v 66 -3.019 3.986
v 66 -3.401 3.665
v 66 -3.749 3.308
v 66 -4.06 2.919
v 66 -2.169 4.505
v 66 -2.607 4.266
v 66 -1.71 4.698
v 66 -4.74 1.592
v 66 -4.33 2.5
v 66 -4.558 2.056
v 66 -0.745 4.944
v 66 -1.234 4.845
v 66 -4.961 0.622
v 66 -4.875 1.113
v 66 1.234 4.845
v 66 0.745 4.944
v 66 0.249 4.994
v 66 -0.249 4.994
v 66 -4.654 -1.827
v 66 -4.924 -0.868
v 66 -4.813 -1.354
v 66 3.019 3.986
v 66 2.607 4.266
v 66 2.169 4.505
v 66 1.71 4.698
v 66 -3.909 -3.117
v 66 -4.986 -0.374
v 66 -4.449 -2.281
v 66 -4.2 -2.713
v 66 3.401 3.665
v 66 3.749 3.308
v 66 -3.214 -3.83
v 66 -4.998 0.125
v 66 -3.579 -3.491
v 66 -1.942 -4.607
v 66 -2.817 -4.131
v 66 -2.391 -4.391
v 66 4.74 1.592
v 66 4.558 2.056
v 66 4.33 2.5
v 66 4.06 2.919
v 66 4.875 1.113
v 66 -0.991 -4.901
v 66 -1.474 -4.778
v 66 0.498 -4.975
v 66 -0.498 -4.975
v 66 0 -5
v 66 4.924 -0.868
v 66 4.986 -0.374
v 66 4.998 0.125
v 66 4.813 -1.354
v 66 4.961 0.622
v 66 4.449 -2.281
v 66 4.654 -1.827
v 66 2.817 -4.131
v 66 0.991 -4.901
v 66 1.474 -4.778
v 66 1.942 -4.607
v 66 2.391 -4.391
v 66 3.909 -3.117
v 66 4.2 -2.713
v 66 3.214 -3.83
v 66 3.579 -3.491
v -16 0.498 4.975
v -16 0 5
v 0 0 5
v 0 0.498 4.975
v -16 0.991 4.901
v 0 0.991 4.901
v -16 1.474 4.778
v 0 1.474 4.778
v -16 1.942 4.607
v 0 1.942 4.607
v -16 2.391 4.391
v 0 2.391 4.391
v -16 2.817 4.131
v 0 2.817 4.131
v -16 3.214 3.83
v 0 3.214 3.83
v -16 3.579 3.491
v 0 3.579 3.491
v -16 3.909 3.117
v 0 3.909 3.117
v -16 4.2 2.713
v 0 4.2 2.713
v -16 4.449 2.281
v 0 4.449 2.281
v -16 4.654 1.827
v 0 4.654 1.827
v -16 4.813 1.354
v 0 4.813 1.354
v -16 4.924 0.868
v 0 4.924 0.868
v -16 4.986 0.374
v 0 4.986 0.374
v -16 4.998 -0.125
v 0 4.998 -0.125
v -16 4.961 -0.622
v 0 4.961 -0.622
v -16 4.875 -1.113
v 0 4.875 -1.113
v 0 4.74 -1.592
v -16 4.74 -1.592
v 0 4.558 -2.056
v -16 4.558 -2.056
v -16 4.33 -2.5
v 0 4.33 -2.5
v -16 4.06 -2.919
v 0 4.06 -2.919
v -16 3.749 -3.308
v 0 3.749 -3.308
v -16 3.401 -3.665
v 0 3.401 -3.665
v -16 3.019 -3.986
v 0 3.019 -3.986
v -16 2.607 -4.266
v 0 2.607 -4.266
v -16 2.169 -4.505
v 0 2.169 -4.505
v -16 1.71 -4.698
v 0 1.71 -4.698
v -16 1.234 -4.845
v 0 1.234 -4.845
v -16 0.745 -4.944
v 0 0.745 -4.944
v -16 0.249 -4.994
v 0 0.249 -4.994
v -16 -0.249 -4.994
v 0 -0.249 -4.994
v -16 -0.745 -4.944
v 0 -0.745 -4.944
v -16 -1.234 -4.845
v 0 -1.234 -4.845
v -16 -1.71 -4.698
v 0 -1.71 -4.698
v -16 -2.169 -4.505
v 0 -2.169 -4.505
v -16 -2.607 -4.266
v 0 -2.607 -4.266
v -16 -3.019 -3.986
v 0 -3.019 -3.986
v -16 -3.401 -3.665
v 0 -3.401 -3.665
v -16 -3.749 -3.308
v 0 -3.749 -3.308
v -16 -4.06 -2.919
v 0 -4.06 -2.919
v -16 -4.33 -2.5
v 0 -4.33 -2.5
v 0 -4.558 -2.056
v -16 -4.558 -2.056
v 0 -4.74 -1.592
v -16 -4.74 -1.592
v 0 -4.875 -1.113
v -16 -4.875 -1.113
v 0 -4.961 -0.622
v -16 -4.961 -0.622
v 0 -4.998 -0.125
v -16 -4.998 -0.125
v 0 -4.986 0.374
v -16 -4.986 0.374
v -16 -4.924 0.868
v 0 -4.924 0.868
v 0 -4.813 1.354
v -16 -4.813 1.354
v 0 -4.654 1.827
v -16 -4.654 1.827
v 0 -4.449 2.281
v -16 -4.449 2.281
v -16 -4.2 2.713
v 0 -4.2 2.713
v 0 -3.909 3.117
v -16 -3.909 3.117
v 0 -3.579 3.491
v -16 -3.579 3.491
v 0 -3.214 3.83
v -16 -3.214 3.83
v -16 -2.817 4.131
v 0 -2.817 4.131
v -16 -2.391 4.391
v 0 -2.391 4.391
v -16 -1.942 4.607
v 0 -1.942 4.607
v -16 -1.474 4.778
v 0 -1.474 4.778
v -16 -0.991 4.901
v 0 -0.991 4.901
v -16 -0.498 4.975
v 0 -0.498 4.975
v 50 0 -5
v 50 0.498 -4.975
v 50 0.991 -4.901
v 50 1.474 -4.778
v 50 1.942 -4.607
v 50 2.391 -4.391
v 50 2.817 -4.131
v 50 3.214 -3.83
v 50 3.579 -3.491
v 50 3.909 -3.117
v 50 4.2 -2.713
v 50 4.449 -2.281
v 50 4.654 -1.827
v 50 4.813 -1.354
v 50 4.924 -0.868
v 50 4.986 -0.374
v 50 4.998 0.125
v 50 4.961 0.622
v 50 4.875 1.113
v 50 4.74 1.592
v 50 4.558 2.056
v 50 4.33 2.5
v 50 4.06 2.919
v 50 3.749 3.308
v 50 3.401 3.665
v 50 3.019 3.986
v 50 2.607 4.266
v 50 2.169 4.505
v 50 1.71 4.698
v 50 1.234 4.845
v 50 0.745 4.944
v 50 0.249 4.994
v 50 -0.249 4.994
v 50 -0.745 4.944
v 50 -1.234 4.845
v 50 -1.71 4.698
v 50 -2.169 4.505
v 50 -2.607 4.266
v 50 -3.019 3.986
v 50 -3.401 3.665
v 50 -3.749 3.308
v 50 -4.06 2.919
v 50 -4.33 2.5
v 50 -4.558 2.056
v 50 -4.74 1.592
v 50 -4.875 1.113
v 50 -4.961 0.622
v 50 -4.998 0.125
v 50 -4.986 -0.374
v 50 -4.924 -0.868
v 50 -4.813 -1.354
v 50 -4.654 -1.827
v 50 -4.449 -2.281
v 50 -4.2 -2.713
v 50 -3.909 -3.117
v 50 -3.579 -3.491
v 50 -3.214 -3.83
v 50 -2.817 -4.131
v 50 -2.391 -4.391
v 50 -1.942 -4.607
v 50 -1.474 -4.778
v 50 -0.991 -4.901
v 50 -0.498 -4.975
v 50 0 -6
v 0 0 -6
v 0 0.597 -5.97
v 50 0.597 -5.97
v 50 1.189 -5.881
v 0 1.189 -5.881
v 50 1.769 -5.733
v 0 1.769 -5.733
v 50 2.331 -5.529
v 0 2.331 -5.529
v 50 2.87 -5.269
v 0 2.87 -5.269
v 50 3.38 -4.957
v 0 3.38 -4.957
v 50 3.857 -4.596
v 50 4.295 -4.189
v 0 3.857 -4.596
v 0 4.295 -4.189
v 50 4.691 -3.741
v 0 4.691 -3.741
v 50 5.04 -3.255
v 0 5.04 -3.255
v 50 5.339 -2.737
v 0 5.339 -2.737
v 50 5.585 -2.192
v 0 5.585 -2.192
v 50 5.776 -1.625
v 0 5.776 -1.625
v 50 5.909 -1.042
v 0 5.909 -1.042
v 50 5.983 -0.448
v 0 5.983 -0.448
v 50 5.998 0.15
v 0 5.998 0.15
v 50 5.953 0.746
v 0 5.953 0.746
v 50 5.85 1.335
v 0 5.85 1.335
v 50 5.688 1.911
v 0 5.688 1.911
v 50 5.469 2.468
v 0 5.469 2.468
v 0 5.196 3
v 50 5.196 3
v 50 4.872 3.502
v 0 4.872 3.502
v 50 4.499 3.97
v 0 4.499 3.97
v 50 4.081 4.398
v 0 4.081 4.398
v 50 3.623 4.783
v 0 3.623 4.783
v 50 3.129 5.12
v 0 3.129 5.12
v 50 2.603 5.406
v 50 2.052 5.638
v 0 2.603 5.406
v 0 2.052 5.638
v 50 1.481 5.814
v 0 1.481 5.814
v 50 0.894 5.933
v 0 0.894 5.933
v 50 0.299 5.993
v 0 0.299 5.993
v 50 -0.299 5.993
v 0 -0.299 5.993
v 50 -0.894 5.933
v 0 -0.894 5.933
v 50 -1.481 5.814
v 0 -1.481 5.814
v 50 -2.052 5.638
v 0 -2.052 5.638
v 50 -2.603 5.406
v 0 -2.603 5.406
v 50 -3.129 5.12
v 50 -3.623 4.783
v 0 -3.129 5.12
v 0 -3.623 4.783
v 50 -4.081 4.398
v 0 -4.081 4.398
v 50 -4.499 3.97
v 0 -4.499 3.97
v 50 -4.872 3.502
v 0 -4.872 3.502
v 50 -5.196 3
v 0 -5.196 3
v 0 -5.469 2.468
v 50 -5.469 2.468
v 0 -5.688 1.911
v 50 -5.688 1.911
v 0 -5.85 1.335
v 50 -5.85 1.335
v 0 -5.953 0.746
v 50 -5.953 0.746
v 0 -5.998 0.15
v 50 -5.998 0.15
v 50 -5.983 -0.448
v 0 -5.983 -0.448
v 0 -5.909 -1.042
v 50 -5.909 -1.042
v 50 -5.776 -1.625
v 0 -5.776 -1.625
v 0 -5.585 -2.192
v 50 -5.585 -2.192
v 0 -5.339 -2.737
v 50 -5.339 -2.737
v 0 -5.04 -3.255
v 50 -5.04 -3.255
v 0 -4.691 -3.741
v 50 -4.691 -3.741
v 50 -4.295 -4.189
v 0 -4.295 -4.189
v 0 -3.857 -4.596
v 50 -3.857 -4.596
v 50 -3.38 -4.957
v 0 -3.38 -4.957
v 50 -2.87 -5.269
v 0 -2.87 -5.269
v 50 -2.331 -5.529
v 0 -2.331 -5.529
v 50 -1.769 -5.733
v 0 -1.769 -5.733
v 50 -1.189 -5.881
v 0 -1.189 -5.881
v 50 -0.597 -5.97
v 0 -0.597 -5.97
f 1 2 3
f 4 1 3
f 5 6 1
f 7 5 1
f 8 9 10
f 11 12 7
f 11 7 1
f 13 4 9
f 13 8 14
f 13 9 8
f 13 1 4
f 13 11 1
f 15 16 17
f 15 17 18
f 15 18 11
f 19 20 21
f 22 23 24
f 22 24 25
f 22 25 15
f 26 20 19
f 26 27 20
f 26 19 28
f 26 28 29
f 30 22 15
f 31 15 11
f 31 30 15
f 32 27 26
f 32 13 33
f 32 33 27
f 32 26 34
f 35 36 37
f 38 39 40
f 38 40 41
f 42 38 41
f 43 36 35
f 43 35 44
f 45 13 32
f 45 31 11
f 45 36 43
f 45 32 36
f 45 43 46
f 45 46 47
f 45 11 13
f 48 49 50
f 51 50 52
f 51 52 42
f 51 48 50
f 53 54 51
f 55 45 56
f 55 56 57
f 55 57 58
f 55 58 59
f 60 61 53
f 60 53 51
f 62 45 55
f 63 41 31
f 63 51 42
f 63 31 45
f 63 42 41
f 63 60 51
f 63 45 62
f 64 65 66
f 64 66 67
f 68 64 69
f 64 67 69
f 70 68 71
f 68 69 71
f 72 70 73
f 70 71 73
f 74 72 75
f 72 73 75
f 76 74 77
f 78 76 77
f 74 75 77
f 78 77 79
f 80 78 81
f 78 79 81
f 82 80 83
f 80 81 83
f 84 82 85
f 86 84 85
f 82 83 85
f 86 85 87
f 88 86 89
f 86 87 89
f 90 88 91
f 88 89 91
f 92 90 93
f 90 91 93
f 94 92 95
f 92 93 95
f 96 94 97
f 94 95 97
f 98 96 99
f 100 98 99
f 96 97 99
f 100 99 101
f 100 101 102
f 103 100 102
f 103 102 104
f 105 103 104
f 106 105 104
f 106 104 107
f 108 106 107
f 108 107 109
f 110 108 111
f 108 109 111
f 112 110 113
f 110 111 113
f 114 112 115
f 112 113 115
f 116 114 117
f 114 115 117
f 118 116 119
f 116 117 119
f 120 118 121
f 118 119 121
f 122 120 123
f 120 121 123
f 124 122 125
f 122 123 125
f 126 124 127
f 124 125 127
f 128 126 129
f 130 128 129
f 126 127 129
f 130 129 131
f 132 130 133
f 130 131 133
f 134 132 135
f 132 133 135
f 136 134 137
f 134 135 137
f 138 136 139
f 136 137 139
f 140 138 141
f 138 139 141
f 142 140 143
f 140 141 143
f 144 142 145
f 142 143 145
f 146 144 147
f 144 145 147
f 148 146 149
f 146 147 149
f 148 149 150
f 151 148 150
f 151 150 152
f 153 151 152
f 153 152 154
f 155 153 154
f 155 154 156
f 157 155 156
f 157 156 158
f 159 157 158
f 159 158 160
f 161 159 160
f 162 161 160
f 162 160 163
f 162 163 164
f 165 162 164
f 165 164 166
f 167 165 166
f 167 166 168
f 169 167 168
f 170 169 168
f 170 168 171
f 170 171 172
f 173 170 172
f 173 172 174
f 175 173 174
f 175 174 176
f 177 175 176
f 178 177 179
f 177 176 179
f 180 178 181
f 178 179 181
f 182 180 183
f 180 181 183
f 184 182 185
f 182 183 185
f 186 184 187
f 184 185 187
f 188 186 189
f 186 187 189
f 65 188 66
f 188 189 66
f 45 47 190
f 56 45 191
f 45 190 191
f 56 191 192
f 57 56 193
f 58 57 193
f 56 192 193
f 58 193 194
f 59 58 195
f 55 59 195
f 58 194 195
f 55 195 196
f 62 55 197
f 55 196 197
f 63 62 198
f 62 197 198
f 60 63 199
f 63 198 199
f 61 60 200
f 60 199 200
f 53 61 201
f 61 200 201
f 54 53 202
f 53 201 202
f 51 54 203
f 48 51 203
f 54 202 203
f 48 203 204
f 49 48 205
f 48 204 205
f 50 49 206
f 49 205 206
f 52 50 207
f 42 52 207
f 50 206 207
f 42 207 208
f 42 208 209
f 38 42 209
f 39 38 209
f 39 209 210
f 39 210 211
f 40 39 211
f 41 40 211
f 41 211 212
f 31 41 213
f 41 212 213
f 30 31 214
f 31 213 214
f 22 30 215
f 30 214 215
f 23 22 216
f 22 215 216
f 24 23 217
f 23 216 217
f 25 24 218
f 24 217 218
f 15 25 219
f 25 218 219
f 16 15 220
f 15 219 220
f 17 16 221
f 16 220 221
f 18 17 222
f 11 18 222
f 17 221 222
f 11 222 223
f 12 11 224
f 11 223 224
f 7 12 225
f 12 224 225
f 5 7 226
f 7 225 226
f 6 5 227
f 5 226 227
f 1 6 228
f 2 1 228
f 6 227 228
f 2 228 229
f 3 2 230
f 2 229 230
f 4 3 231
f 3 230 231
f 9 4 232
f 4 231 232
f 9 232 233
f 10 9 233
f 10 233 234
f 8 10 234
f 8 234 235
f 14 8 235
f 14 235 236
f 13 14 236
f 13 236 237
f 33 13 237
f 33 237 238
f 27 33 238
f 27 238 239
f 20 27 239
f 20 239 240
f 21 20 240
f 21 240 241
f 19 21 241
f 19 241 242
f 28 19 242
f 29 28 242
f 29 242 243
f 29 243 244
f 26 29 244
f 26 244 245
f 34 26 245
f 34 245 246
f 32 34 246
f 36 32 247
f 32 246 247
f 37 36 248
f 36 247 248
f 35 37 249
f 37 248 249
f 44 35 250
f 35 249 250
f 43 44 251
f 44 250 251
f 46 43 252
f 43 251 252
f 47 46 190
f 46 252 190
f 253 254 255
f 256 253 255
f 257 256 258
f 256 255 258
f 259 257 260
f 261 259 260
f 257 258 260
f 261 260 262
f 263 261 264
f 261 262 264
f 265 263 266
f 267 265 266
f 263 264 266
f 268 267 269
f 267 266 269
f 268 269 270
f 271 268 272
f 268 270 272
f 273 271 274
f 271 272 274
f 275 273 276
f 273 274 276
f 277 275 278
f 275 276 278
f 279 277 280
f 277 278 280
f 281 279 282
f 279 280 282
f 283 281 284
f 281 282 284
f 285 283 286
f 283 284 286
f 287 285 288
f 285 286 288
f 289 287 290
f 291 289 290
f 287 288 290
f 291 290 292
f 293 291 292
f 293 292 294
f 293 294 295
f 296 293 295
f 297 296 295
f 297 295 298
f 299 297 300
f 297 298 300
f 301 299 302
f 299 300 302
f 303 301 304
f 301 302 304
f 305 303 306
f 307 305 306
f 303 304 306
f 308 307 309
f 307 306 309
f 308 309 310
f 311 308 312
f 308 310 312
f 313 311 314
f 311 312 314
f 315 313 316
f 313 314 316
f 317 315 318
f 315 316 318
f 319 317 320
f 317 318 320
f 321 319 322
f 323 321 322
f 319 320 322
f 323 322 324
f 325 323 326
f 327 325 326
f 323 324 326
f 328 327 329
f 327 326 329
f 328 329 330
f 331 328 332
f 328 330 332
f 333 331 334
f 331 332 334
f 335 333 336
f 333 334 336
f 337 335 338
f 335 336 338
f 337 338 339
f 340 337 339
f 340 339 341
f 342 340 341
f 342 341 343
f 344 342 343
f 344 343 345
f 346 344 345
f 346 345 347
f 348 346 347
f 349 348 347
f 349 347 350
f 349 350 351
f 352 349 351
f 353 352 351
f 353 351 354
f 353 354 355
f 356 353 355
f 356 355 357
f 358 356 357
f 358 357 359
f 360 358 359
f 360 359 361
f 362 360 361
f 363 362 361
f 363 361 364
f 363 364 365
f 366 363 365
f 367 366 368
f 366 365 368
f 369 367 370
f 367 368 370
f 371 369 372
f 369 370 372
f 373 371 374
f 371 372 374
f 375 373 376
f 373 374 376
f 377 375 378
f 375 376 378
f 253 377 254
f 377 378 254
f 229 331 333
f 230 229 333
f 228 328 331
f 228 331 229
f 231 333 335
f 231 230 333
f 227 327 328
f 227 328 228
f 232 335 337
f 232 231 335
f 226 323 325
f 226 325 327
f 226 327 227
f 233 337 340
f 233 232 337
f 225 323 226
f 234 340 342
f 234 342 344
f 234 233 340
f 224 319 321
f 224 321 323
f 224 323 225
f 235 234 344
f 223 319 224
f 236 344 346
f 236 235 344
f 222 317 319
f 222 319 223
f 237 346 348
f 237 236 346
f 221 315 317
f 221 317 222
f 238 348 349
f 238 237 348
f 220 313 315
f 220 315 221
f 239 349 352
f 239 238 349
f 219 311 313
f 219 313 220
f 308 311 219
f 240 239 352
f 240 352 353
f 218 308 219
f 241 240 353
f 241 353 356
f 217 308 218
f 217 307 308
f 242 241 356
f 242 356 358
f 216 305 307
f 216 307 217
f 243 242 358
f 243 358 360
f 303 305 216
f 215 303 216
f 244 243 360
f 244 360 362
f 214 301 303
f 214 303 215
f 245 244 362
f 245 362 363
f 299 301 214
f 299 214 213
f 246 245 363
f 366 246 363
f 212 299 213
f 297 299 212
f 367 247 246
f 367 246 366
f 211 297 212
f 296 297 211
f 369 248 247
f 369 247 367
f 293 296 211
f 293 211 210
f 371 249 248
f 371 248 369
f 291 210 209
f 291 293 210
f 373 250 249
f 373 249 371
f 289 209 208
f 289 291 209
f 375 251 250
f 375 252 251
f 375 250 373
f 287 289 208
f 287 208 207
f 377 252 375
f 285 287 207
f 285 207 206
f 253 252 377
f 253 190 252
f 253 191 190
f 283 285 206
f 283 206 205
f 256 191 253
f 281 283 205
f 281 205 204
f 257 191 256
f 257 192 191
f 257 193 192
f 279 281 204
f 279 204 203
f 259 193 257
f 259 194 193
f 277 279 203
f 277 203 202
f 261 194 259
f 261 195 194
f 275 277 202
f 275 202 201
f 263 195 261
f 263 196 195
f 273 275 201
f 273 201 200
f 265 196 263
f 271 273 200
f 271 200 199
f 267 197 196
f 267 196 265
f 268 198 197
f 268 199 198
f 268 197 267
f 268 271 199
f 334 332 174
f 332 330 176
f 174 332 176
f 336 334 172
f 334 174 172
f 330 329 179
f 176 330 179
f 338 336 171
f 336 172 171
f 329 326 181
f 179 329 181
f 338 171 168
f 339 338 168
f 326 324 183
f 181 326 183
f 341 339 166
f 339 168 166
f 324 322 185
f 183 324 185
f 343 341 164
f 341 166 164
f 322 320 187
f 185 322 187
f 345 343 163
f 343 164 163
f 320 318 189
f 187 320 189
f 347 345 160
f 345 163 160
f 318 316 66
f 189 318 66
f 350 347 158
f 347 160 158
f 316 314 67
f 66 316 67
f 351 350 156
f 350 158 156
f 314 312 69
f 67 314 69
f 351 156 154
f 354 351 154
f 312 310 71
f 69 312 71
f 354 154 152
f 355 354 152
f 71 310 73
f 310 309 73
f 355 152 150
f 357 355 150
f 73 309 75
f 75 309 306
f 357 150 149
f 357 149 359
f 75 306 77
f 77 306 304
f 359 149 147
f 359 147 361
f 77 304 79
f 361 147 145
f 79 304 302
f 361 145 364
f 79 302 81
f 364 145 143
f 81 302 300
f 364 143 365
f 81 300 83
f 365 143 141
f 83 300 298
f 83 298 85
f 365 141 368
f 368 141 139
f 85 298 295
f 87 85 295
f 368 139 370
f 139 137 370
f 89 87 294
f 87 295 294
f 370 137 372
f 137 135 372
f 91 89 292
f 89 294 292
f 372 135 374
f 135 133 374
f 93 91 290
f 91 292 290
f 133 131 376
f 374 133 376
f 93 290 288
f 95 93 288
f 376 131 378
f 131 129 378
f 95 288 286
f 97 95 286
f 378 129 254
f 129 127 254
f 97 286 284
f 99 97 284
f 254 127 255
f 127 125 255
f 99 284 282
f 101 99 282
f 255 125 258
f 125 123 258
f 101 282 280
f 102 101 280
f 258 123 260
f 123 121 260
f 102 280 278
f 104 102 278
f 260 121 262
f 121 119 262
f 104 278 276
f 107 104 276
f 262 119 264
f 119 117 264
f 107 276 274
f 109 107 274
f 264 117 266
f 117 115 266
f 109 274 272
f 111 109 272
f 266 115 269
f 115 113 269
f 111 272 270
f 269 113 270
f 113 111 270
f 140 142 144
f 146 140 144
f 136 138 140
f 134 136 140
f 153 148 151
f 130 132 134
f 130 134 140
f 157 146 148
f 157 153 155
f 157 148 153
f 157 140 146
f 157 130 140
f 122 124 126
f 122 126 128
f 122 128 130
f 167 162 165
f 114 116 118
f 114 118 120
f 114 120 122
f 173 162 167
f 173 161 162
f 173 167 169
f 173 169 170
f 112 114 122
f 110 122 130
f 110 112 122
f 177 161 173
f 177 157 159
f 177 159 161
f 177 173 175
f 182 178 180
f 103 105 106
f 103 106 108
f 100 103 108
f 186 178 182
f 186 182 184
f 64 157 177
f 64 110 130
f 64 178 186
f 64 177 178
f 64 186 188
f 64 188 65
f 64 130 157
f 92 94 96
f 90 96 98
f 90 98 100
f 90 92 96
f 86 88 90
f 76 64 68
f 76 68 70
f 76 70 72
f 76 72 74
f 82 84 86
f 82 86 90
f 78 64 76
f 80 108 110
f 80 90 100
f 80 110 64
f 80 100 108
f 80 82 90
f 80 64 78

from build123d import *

# Parameters (mm, degrees)
IZIM1_R                     = 6
Y_KSEKLIK_EKSTR_ZYON1_DEPTH = 50
IZIM2_R                     = 5
Y_KSEKLIK_EKSTR_ZYON2_DEPTH = 16
IZIM3_R                     = 5
Y_KSEKLIK_EKSTR_ZYON3_DEPTH = 16


with BuildPart() as part:
    # Çizim1 → Yükseklik-Ekstrüzyon1 (new body)
    with BuildSketch(Plane(origin=(0, 0, 0), x_dir=(0, 0, -1), z_dir=(1, 0, 0))):
        Circle(IZIM1_R)
    extrude(amount=Y_KSEKLIK_EKSTR_ZYON1_DEPTH)

    # Çizim2 → Yükseklik-Ekstrüzyon2 (add)
    with BuildSketch(Plane.ZY):
        Circle(IZIM2_R)
    extrude(amount=Y_KSEKLIK_EKSTR_ZYON2_DEPTH)

    # Çizim3 → Yükseklik-Ekstrüzyon3 (add)
    with BuildSketch(Plane(origin=(50, 0, 0), x_dir=(0, 0, -1), z_dir=(1, 0, 0))):
        Circle(IZIM3_R)
    extrude(amount=Y_KSEKLIK_EKSTR_ZYON3_DEPTH)


solid = part.part
